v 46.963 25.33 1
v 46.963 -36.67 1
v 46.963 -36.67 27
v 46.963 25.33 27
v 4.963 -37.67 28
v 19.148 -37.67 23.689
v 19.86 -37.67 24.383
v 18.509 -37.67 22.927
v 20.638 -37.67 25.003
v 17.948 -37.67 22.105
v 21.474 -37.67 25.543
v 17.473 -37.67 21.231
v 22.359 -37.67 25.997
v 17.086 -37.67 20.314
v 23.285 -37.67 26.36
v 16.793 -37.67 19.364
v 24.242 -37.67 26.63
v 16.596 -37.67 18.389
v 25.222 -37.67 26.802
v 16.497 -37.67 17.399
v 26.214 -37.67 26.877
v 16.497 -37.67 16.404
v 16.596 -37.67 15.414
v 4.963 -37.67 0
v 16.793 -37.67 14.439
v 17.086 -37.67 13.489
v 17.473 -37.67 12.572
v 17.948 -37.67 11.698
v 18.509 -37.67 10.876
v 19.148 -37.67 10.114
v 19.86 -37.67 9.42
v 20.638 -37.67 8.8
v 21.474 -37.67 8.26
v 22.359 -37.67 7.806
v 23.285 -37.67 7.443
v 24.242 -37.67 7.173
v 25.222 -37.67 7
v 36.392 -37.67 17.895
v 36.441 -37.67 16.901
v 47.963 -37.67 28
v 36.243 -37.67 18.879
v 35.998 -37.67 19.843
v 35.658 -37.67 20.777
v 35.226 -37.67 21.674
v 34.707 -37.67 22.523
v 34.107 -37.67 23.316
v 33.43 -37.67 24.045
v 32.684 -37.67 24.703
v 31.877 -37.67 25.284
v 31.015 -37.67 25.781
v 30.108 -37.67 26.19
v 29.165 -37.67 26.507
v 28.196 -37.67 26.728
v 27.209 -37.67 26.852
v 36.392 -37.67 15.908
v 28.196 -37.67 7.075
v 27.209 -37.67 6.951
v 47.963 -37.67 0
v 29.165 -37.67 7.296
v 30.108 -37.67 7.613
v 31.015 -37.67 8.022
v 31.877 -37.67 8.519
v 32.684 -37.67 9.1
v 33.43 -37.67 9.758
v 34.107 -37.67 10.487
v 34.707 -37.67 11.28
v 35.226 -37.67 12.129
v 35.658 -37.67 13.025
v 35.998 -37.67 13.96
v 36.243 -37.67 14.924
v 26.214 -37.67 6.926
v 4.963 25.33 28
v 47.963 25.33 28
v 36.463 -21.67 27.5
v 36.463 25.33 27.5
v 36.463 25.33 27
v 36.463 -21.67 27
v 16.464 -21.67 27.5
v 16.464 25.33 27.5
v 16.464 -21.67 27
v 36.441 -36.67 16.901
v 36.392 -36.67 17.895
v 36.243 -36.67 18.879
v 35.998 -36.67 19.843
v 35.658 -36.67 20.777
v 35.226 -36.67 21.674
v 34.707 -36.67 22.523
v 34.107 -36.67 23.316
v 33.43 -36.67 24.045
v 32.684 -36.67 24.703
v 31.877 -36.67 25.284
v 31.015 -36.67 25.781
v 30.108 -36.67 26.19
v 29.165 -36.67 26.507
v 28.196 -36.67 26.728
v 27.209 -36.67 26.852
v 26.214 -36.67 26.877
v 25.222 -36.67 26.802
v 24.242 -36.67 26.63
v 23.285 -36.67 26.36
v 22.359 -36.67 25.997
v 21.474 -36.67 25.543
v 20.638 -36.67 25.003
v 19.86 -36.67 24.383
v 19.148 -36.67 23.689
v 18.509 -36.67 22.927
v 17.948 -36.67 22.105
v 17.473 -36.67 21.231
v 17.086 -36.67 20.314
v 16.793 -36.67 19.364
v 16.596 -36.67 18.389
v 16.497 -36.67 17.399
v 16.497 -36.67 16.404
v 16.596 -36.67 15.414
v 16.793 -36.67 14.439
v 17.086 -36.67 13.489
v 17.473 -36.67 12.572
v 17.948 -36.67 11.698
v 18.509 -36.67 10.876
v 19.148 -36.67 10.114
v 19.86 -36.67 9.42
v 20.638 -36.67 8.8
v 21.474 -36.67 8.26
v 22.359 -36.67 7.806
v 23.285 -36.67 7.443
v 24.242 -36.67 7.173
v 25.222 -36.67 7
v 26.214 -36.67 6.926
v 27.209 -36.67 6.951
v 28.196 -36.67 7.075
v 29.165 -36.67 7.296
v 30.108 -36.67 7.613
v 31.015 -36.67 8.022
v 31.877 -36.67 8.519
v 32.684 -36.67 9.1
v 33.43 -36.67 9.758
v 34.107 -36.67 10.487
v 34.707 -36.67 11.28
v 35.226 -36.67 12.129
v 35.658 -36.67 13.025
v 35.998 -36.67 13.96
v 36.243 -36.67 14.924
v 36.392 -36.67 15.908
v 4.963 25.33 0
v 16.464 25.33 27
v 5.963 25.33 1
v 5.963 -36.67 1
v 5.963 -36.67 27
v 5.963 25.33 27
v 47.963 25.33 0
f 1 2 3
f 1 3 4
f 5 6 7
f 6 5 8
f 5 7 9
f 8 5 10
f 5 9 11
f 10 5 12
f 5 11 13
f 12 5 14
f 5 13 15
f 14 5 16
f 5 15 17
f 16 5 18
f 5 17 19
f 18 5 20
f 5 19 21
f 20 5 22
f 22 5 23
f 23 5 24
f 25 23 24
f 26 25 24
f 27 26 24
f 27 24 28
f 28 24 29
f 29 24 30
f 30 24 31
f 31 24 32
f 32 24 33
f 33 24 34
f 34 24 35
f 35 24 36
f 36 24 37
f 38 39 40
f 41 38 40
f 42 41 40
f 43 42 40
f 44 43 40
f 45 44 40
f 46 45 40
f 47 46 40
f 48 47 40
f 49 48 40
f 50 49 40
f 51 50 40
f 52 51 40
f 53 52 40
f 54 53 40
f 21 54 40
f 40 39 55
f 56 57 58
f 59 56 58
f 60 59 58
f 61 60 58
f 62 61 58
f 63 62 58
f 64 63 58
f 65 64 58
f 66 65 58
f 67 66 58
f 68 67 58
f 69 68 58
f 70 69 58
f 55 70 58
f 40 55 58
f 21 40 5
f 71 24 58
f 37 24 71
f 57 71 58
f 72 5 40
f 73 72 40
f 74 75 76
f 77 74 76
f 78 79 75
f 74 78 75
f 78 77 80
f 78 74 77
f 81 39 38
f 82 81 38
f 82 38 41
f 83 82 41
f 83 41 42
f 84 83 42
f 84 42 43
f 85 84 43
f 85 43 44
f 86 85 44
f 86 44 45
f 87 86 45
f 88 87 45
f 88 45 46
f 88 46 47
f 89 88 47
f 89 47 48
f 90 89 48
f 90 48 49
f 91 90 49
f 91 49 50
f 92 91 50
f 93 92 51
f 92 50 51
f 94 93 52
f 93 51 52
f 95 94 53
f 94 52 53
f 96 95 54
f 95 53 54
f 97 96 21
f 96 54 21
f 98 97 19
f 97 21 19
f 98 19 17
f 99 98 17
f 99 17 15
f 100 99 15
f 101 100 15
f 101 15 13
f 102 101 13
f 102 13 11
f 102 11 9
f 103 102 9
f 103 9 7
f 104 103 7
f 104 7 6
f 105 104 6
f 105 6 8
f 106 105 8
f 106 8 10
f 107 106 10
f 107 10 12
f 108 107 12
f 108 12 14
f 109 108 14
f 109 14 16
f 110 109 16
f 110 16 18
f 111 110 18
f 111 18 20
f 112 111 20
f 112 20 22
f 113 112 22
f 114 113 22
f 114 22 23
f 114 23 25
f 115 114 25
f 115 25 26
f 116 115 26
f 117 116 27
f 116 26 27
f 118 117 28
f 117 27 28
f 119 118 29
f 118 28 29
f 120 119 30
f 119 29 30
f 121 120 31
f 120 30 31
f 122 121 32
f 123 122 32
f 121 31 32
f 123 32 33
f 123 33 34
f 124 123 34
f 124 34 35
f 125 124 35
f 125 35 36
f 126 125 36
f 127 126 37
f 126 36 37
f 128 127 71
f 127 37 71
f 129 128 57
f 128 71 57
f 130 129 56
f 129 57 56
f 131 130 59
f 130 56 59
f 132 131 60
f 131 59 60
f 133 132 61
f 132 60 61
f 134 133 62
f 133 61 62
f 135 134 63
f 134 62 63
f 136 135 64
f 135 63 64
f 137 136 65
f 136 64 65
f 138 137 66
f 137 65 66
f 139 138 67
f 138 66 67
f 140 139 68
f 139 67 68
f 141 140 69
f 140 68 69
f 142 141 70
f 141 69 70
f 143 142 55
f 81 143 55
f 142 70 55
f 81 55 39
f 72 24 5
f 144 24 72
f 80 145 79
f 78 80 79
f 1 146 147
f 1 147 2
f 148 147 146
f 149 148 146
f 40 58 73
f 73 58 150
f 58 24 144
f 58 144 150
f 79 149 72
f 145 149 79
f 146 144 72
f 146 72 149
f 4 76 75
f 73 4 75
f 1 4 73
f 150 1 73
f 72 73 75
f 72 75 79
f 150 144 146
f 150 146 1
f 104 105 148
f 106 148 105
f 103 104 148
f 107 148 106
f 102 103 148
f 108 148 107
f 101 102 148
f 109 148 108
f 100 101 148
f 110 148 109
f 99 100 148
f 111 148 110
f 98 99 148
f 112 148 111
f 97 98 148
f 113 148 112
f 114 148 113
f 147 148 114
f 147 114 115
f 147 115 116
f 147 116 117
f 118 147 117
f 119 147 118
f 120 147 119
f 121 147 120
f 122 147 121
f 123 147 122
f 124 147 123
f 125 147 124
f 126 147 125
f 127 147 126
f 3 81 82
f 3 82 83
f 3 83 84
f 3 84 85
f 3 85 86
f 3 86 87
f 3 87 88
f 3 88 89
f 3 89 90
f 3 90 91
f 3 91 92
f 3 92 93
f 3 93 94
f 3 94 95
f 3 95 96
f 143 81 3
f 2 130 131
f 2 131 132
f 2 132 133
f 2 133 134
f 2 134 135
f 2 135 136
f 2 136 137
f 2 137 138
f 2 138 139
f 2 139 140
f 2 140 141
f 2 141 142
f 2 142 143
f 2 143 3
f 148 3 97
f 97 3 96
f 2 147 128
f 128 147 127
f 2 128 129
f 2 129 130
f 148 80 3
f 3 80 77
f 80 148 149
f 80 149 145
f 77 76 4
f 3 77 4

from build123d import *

# Parameters (mm, degrees)
F0_W     = 43
F0_H     = 63
F1_DEPTH = 28
F2_R     = 9.9784830952
F3_DEPTH = 63
F4_T     = -1
F6_DEPTH = 47


with BuildPart() as f1:
    # F0 (on Top) → F1 (new body)
    with BuildSketch(Plane.XY):
        with Locations((26.4628629982, -6.1696139574)):
            Rectangle(F0_W, F0_H)
    extrude(amount=F1_DEPTH)

    # F2 (on face) → F3 (cut)
    with BuildSketch(Plane.XZ.offset(37.6696139574)):
        with Locations((26.4628629982, 16.9014558196)):
            Circle(F2_R)
    extrude(amount=-F3_DEPTH, mode=Mode.SUBTRACT)

    # F4
    f4_openings = [f1.faces().sort_by_distance(p)[0] for p in [
        (16.48438, -6.169614, 16.901456),
        (47.449735, 25.330386, 14),
    ]]
    offset(amount=F4_T, openings=f4_openings)

    # F5 (on face) → F6 (cut)
    with BuildSketch(Plane(origin=(0, 25.3303860426, 0), x_dir=(-1, 0, 0), z_dir=(0, 1, 0))):
        Polygon((-36.4628629982, 27), (-26.4628629982, 27), (-16.4644755423, 27), (-16.4644755423, 27.5), (-36.4628629982, 27.5), align=None)
    extrude(amount=-F6_DEPTH, mode=Mode.SUBTRACT)


solid = f1.part
